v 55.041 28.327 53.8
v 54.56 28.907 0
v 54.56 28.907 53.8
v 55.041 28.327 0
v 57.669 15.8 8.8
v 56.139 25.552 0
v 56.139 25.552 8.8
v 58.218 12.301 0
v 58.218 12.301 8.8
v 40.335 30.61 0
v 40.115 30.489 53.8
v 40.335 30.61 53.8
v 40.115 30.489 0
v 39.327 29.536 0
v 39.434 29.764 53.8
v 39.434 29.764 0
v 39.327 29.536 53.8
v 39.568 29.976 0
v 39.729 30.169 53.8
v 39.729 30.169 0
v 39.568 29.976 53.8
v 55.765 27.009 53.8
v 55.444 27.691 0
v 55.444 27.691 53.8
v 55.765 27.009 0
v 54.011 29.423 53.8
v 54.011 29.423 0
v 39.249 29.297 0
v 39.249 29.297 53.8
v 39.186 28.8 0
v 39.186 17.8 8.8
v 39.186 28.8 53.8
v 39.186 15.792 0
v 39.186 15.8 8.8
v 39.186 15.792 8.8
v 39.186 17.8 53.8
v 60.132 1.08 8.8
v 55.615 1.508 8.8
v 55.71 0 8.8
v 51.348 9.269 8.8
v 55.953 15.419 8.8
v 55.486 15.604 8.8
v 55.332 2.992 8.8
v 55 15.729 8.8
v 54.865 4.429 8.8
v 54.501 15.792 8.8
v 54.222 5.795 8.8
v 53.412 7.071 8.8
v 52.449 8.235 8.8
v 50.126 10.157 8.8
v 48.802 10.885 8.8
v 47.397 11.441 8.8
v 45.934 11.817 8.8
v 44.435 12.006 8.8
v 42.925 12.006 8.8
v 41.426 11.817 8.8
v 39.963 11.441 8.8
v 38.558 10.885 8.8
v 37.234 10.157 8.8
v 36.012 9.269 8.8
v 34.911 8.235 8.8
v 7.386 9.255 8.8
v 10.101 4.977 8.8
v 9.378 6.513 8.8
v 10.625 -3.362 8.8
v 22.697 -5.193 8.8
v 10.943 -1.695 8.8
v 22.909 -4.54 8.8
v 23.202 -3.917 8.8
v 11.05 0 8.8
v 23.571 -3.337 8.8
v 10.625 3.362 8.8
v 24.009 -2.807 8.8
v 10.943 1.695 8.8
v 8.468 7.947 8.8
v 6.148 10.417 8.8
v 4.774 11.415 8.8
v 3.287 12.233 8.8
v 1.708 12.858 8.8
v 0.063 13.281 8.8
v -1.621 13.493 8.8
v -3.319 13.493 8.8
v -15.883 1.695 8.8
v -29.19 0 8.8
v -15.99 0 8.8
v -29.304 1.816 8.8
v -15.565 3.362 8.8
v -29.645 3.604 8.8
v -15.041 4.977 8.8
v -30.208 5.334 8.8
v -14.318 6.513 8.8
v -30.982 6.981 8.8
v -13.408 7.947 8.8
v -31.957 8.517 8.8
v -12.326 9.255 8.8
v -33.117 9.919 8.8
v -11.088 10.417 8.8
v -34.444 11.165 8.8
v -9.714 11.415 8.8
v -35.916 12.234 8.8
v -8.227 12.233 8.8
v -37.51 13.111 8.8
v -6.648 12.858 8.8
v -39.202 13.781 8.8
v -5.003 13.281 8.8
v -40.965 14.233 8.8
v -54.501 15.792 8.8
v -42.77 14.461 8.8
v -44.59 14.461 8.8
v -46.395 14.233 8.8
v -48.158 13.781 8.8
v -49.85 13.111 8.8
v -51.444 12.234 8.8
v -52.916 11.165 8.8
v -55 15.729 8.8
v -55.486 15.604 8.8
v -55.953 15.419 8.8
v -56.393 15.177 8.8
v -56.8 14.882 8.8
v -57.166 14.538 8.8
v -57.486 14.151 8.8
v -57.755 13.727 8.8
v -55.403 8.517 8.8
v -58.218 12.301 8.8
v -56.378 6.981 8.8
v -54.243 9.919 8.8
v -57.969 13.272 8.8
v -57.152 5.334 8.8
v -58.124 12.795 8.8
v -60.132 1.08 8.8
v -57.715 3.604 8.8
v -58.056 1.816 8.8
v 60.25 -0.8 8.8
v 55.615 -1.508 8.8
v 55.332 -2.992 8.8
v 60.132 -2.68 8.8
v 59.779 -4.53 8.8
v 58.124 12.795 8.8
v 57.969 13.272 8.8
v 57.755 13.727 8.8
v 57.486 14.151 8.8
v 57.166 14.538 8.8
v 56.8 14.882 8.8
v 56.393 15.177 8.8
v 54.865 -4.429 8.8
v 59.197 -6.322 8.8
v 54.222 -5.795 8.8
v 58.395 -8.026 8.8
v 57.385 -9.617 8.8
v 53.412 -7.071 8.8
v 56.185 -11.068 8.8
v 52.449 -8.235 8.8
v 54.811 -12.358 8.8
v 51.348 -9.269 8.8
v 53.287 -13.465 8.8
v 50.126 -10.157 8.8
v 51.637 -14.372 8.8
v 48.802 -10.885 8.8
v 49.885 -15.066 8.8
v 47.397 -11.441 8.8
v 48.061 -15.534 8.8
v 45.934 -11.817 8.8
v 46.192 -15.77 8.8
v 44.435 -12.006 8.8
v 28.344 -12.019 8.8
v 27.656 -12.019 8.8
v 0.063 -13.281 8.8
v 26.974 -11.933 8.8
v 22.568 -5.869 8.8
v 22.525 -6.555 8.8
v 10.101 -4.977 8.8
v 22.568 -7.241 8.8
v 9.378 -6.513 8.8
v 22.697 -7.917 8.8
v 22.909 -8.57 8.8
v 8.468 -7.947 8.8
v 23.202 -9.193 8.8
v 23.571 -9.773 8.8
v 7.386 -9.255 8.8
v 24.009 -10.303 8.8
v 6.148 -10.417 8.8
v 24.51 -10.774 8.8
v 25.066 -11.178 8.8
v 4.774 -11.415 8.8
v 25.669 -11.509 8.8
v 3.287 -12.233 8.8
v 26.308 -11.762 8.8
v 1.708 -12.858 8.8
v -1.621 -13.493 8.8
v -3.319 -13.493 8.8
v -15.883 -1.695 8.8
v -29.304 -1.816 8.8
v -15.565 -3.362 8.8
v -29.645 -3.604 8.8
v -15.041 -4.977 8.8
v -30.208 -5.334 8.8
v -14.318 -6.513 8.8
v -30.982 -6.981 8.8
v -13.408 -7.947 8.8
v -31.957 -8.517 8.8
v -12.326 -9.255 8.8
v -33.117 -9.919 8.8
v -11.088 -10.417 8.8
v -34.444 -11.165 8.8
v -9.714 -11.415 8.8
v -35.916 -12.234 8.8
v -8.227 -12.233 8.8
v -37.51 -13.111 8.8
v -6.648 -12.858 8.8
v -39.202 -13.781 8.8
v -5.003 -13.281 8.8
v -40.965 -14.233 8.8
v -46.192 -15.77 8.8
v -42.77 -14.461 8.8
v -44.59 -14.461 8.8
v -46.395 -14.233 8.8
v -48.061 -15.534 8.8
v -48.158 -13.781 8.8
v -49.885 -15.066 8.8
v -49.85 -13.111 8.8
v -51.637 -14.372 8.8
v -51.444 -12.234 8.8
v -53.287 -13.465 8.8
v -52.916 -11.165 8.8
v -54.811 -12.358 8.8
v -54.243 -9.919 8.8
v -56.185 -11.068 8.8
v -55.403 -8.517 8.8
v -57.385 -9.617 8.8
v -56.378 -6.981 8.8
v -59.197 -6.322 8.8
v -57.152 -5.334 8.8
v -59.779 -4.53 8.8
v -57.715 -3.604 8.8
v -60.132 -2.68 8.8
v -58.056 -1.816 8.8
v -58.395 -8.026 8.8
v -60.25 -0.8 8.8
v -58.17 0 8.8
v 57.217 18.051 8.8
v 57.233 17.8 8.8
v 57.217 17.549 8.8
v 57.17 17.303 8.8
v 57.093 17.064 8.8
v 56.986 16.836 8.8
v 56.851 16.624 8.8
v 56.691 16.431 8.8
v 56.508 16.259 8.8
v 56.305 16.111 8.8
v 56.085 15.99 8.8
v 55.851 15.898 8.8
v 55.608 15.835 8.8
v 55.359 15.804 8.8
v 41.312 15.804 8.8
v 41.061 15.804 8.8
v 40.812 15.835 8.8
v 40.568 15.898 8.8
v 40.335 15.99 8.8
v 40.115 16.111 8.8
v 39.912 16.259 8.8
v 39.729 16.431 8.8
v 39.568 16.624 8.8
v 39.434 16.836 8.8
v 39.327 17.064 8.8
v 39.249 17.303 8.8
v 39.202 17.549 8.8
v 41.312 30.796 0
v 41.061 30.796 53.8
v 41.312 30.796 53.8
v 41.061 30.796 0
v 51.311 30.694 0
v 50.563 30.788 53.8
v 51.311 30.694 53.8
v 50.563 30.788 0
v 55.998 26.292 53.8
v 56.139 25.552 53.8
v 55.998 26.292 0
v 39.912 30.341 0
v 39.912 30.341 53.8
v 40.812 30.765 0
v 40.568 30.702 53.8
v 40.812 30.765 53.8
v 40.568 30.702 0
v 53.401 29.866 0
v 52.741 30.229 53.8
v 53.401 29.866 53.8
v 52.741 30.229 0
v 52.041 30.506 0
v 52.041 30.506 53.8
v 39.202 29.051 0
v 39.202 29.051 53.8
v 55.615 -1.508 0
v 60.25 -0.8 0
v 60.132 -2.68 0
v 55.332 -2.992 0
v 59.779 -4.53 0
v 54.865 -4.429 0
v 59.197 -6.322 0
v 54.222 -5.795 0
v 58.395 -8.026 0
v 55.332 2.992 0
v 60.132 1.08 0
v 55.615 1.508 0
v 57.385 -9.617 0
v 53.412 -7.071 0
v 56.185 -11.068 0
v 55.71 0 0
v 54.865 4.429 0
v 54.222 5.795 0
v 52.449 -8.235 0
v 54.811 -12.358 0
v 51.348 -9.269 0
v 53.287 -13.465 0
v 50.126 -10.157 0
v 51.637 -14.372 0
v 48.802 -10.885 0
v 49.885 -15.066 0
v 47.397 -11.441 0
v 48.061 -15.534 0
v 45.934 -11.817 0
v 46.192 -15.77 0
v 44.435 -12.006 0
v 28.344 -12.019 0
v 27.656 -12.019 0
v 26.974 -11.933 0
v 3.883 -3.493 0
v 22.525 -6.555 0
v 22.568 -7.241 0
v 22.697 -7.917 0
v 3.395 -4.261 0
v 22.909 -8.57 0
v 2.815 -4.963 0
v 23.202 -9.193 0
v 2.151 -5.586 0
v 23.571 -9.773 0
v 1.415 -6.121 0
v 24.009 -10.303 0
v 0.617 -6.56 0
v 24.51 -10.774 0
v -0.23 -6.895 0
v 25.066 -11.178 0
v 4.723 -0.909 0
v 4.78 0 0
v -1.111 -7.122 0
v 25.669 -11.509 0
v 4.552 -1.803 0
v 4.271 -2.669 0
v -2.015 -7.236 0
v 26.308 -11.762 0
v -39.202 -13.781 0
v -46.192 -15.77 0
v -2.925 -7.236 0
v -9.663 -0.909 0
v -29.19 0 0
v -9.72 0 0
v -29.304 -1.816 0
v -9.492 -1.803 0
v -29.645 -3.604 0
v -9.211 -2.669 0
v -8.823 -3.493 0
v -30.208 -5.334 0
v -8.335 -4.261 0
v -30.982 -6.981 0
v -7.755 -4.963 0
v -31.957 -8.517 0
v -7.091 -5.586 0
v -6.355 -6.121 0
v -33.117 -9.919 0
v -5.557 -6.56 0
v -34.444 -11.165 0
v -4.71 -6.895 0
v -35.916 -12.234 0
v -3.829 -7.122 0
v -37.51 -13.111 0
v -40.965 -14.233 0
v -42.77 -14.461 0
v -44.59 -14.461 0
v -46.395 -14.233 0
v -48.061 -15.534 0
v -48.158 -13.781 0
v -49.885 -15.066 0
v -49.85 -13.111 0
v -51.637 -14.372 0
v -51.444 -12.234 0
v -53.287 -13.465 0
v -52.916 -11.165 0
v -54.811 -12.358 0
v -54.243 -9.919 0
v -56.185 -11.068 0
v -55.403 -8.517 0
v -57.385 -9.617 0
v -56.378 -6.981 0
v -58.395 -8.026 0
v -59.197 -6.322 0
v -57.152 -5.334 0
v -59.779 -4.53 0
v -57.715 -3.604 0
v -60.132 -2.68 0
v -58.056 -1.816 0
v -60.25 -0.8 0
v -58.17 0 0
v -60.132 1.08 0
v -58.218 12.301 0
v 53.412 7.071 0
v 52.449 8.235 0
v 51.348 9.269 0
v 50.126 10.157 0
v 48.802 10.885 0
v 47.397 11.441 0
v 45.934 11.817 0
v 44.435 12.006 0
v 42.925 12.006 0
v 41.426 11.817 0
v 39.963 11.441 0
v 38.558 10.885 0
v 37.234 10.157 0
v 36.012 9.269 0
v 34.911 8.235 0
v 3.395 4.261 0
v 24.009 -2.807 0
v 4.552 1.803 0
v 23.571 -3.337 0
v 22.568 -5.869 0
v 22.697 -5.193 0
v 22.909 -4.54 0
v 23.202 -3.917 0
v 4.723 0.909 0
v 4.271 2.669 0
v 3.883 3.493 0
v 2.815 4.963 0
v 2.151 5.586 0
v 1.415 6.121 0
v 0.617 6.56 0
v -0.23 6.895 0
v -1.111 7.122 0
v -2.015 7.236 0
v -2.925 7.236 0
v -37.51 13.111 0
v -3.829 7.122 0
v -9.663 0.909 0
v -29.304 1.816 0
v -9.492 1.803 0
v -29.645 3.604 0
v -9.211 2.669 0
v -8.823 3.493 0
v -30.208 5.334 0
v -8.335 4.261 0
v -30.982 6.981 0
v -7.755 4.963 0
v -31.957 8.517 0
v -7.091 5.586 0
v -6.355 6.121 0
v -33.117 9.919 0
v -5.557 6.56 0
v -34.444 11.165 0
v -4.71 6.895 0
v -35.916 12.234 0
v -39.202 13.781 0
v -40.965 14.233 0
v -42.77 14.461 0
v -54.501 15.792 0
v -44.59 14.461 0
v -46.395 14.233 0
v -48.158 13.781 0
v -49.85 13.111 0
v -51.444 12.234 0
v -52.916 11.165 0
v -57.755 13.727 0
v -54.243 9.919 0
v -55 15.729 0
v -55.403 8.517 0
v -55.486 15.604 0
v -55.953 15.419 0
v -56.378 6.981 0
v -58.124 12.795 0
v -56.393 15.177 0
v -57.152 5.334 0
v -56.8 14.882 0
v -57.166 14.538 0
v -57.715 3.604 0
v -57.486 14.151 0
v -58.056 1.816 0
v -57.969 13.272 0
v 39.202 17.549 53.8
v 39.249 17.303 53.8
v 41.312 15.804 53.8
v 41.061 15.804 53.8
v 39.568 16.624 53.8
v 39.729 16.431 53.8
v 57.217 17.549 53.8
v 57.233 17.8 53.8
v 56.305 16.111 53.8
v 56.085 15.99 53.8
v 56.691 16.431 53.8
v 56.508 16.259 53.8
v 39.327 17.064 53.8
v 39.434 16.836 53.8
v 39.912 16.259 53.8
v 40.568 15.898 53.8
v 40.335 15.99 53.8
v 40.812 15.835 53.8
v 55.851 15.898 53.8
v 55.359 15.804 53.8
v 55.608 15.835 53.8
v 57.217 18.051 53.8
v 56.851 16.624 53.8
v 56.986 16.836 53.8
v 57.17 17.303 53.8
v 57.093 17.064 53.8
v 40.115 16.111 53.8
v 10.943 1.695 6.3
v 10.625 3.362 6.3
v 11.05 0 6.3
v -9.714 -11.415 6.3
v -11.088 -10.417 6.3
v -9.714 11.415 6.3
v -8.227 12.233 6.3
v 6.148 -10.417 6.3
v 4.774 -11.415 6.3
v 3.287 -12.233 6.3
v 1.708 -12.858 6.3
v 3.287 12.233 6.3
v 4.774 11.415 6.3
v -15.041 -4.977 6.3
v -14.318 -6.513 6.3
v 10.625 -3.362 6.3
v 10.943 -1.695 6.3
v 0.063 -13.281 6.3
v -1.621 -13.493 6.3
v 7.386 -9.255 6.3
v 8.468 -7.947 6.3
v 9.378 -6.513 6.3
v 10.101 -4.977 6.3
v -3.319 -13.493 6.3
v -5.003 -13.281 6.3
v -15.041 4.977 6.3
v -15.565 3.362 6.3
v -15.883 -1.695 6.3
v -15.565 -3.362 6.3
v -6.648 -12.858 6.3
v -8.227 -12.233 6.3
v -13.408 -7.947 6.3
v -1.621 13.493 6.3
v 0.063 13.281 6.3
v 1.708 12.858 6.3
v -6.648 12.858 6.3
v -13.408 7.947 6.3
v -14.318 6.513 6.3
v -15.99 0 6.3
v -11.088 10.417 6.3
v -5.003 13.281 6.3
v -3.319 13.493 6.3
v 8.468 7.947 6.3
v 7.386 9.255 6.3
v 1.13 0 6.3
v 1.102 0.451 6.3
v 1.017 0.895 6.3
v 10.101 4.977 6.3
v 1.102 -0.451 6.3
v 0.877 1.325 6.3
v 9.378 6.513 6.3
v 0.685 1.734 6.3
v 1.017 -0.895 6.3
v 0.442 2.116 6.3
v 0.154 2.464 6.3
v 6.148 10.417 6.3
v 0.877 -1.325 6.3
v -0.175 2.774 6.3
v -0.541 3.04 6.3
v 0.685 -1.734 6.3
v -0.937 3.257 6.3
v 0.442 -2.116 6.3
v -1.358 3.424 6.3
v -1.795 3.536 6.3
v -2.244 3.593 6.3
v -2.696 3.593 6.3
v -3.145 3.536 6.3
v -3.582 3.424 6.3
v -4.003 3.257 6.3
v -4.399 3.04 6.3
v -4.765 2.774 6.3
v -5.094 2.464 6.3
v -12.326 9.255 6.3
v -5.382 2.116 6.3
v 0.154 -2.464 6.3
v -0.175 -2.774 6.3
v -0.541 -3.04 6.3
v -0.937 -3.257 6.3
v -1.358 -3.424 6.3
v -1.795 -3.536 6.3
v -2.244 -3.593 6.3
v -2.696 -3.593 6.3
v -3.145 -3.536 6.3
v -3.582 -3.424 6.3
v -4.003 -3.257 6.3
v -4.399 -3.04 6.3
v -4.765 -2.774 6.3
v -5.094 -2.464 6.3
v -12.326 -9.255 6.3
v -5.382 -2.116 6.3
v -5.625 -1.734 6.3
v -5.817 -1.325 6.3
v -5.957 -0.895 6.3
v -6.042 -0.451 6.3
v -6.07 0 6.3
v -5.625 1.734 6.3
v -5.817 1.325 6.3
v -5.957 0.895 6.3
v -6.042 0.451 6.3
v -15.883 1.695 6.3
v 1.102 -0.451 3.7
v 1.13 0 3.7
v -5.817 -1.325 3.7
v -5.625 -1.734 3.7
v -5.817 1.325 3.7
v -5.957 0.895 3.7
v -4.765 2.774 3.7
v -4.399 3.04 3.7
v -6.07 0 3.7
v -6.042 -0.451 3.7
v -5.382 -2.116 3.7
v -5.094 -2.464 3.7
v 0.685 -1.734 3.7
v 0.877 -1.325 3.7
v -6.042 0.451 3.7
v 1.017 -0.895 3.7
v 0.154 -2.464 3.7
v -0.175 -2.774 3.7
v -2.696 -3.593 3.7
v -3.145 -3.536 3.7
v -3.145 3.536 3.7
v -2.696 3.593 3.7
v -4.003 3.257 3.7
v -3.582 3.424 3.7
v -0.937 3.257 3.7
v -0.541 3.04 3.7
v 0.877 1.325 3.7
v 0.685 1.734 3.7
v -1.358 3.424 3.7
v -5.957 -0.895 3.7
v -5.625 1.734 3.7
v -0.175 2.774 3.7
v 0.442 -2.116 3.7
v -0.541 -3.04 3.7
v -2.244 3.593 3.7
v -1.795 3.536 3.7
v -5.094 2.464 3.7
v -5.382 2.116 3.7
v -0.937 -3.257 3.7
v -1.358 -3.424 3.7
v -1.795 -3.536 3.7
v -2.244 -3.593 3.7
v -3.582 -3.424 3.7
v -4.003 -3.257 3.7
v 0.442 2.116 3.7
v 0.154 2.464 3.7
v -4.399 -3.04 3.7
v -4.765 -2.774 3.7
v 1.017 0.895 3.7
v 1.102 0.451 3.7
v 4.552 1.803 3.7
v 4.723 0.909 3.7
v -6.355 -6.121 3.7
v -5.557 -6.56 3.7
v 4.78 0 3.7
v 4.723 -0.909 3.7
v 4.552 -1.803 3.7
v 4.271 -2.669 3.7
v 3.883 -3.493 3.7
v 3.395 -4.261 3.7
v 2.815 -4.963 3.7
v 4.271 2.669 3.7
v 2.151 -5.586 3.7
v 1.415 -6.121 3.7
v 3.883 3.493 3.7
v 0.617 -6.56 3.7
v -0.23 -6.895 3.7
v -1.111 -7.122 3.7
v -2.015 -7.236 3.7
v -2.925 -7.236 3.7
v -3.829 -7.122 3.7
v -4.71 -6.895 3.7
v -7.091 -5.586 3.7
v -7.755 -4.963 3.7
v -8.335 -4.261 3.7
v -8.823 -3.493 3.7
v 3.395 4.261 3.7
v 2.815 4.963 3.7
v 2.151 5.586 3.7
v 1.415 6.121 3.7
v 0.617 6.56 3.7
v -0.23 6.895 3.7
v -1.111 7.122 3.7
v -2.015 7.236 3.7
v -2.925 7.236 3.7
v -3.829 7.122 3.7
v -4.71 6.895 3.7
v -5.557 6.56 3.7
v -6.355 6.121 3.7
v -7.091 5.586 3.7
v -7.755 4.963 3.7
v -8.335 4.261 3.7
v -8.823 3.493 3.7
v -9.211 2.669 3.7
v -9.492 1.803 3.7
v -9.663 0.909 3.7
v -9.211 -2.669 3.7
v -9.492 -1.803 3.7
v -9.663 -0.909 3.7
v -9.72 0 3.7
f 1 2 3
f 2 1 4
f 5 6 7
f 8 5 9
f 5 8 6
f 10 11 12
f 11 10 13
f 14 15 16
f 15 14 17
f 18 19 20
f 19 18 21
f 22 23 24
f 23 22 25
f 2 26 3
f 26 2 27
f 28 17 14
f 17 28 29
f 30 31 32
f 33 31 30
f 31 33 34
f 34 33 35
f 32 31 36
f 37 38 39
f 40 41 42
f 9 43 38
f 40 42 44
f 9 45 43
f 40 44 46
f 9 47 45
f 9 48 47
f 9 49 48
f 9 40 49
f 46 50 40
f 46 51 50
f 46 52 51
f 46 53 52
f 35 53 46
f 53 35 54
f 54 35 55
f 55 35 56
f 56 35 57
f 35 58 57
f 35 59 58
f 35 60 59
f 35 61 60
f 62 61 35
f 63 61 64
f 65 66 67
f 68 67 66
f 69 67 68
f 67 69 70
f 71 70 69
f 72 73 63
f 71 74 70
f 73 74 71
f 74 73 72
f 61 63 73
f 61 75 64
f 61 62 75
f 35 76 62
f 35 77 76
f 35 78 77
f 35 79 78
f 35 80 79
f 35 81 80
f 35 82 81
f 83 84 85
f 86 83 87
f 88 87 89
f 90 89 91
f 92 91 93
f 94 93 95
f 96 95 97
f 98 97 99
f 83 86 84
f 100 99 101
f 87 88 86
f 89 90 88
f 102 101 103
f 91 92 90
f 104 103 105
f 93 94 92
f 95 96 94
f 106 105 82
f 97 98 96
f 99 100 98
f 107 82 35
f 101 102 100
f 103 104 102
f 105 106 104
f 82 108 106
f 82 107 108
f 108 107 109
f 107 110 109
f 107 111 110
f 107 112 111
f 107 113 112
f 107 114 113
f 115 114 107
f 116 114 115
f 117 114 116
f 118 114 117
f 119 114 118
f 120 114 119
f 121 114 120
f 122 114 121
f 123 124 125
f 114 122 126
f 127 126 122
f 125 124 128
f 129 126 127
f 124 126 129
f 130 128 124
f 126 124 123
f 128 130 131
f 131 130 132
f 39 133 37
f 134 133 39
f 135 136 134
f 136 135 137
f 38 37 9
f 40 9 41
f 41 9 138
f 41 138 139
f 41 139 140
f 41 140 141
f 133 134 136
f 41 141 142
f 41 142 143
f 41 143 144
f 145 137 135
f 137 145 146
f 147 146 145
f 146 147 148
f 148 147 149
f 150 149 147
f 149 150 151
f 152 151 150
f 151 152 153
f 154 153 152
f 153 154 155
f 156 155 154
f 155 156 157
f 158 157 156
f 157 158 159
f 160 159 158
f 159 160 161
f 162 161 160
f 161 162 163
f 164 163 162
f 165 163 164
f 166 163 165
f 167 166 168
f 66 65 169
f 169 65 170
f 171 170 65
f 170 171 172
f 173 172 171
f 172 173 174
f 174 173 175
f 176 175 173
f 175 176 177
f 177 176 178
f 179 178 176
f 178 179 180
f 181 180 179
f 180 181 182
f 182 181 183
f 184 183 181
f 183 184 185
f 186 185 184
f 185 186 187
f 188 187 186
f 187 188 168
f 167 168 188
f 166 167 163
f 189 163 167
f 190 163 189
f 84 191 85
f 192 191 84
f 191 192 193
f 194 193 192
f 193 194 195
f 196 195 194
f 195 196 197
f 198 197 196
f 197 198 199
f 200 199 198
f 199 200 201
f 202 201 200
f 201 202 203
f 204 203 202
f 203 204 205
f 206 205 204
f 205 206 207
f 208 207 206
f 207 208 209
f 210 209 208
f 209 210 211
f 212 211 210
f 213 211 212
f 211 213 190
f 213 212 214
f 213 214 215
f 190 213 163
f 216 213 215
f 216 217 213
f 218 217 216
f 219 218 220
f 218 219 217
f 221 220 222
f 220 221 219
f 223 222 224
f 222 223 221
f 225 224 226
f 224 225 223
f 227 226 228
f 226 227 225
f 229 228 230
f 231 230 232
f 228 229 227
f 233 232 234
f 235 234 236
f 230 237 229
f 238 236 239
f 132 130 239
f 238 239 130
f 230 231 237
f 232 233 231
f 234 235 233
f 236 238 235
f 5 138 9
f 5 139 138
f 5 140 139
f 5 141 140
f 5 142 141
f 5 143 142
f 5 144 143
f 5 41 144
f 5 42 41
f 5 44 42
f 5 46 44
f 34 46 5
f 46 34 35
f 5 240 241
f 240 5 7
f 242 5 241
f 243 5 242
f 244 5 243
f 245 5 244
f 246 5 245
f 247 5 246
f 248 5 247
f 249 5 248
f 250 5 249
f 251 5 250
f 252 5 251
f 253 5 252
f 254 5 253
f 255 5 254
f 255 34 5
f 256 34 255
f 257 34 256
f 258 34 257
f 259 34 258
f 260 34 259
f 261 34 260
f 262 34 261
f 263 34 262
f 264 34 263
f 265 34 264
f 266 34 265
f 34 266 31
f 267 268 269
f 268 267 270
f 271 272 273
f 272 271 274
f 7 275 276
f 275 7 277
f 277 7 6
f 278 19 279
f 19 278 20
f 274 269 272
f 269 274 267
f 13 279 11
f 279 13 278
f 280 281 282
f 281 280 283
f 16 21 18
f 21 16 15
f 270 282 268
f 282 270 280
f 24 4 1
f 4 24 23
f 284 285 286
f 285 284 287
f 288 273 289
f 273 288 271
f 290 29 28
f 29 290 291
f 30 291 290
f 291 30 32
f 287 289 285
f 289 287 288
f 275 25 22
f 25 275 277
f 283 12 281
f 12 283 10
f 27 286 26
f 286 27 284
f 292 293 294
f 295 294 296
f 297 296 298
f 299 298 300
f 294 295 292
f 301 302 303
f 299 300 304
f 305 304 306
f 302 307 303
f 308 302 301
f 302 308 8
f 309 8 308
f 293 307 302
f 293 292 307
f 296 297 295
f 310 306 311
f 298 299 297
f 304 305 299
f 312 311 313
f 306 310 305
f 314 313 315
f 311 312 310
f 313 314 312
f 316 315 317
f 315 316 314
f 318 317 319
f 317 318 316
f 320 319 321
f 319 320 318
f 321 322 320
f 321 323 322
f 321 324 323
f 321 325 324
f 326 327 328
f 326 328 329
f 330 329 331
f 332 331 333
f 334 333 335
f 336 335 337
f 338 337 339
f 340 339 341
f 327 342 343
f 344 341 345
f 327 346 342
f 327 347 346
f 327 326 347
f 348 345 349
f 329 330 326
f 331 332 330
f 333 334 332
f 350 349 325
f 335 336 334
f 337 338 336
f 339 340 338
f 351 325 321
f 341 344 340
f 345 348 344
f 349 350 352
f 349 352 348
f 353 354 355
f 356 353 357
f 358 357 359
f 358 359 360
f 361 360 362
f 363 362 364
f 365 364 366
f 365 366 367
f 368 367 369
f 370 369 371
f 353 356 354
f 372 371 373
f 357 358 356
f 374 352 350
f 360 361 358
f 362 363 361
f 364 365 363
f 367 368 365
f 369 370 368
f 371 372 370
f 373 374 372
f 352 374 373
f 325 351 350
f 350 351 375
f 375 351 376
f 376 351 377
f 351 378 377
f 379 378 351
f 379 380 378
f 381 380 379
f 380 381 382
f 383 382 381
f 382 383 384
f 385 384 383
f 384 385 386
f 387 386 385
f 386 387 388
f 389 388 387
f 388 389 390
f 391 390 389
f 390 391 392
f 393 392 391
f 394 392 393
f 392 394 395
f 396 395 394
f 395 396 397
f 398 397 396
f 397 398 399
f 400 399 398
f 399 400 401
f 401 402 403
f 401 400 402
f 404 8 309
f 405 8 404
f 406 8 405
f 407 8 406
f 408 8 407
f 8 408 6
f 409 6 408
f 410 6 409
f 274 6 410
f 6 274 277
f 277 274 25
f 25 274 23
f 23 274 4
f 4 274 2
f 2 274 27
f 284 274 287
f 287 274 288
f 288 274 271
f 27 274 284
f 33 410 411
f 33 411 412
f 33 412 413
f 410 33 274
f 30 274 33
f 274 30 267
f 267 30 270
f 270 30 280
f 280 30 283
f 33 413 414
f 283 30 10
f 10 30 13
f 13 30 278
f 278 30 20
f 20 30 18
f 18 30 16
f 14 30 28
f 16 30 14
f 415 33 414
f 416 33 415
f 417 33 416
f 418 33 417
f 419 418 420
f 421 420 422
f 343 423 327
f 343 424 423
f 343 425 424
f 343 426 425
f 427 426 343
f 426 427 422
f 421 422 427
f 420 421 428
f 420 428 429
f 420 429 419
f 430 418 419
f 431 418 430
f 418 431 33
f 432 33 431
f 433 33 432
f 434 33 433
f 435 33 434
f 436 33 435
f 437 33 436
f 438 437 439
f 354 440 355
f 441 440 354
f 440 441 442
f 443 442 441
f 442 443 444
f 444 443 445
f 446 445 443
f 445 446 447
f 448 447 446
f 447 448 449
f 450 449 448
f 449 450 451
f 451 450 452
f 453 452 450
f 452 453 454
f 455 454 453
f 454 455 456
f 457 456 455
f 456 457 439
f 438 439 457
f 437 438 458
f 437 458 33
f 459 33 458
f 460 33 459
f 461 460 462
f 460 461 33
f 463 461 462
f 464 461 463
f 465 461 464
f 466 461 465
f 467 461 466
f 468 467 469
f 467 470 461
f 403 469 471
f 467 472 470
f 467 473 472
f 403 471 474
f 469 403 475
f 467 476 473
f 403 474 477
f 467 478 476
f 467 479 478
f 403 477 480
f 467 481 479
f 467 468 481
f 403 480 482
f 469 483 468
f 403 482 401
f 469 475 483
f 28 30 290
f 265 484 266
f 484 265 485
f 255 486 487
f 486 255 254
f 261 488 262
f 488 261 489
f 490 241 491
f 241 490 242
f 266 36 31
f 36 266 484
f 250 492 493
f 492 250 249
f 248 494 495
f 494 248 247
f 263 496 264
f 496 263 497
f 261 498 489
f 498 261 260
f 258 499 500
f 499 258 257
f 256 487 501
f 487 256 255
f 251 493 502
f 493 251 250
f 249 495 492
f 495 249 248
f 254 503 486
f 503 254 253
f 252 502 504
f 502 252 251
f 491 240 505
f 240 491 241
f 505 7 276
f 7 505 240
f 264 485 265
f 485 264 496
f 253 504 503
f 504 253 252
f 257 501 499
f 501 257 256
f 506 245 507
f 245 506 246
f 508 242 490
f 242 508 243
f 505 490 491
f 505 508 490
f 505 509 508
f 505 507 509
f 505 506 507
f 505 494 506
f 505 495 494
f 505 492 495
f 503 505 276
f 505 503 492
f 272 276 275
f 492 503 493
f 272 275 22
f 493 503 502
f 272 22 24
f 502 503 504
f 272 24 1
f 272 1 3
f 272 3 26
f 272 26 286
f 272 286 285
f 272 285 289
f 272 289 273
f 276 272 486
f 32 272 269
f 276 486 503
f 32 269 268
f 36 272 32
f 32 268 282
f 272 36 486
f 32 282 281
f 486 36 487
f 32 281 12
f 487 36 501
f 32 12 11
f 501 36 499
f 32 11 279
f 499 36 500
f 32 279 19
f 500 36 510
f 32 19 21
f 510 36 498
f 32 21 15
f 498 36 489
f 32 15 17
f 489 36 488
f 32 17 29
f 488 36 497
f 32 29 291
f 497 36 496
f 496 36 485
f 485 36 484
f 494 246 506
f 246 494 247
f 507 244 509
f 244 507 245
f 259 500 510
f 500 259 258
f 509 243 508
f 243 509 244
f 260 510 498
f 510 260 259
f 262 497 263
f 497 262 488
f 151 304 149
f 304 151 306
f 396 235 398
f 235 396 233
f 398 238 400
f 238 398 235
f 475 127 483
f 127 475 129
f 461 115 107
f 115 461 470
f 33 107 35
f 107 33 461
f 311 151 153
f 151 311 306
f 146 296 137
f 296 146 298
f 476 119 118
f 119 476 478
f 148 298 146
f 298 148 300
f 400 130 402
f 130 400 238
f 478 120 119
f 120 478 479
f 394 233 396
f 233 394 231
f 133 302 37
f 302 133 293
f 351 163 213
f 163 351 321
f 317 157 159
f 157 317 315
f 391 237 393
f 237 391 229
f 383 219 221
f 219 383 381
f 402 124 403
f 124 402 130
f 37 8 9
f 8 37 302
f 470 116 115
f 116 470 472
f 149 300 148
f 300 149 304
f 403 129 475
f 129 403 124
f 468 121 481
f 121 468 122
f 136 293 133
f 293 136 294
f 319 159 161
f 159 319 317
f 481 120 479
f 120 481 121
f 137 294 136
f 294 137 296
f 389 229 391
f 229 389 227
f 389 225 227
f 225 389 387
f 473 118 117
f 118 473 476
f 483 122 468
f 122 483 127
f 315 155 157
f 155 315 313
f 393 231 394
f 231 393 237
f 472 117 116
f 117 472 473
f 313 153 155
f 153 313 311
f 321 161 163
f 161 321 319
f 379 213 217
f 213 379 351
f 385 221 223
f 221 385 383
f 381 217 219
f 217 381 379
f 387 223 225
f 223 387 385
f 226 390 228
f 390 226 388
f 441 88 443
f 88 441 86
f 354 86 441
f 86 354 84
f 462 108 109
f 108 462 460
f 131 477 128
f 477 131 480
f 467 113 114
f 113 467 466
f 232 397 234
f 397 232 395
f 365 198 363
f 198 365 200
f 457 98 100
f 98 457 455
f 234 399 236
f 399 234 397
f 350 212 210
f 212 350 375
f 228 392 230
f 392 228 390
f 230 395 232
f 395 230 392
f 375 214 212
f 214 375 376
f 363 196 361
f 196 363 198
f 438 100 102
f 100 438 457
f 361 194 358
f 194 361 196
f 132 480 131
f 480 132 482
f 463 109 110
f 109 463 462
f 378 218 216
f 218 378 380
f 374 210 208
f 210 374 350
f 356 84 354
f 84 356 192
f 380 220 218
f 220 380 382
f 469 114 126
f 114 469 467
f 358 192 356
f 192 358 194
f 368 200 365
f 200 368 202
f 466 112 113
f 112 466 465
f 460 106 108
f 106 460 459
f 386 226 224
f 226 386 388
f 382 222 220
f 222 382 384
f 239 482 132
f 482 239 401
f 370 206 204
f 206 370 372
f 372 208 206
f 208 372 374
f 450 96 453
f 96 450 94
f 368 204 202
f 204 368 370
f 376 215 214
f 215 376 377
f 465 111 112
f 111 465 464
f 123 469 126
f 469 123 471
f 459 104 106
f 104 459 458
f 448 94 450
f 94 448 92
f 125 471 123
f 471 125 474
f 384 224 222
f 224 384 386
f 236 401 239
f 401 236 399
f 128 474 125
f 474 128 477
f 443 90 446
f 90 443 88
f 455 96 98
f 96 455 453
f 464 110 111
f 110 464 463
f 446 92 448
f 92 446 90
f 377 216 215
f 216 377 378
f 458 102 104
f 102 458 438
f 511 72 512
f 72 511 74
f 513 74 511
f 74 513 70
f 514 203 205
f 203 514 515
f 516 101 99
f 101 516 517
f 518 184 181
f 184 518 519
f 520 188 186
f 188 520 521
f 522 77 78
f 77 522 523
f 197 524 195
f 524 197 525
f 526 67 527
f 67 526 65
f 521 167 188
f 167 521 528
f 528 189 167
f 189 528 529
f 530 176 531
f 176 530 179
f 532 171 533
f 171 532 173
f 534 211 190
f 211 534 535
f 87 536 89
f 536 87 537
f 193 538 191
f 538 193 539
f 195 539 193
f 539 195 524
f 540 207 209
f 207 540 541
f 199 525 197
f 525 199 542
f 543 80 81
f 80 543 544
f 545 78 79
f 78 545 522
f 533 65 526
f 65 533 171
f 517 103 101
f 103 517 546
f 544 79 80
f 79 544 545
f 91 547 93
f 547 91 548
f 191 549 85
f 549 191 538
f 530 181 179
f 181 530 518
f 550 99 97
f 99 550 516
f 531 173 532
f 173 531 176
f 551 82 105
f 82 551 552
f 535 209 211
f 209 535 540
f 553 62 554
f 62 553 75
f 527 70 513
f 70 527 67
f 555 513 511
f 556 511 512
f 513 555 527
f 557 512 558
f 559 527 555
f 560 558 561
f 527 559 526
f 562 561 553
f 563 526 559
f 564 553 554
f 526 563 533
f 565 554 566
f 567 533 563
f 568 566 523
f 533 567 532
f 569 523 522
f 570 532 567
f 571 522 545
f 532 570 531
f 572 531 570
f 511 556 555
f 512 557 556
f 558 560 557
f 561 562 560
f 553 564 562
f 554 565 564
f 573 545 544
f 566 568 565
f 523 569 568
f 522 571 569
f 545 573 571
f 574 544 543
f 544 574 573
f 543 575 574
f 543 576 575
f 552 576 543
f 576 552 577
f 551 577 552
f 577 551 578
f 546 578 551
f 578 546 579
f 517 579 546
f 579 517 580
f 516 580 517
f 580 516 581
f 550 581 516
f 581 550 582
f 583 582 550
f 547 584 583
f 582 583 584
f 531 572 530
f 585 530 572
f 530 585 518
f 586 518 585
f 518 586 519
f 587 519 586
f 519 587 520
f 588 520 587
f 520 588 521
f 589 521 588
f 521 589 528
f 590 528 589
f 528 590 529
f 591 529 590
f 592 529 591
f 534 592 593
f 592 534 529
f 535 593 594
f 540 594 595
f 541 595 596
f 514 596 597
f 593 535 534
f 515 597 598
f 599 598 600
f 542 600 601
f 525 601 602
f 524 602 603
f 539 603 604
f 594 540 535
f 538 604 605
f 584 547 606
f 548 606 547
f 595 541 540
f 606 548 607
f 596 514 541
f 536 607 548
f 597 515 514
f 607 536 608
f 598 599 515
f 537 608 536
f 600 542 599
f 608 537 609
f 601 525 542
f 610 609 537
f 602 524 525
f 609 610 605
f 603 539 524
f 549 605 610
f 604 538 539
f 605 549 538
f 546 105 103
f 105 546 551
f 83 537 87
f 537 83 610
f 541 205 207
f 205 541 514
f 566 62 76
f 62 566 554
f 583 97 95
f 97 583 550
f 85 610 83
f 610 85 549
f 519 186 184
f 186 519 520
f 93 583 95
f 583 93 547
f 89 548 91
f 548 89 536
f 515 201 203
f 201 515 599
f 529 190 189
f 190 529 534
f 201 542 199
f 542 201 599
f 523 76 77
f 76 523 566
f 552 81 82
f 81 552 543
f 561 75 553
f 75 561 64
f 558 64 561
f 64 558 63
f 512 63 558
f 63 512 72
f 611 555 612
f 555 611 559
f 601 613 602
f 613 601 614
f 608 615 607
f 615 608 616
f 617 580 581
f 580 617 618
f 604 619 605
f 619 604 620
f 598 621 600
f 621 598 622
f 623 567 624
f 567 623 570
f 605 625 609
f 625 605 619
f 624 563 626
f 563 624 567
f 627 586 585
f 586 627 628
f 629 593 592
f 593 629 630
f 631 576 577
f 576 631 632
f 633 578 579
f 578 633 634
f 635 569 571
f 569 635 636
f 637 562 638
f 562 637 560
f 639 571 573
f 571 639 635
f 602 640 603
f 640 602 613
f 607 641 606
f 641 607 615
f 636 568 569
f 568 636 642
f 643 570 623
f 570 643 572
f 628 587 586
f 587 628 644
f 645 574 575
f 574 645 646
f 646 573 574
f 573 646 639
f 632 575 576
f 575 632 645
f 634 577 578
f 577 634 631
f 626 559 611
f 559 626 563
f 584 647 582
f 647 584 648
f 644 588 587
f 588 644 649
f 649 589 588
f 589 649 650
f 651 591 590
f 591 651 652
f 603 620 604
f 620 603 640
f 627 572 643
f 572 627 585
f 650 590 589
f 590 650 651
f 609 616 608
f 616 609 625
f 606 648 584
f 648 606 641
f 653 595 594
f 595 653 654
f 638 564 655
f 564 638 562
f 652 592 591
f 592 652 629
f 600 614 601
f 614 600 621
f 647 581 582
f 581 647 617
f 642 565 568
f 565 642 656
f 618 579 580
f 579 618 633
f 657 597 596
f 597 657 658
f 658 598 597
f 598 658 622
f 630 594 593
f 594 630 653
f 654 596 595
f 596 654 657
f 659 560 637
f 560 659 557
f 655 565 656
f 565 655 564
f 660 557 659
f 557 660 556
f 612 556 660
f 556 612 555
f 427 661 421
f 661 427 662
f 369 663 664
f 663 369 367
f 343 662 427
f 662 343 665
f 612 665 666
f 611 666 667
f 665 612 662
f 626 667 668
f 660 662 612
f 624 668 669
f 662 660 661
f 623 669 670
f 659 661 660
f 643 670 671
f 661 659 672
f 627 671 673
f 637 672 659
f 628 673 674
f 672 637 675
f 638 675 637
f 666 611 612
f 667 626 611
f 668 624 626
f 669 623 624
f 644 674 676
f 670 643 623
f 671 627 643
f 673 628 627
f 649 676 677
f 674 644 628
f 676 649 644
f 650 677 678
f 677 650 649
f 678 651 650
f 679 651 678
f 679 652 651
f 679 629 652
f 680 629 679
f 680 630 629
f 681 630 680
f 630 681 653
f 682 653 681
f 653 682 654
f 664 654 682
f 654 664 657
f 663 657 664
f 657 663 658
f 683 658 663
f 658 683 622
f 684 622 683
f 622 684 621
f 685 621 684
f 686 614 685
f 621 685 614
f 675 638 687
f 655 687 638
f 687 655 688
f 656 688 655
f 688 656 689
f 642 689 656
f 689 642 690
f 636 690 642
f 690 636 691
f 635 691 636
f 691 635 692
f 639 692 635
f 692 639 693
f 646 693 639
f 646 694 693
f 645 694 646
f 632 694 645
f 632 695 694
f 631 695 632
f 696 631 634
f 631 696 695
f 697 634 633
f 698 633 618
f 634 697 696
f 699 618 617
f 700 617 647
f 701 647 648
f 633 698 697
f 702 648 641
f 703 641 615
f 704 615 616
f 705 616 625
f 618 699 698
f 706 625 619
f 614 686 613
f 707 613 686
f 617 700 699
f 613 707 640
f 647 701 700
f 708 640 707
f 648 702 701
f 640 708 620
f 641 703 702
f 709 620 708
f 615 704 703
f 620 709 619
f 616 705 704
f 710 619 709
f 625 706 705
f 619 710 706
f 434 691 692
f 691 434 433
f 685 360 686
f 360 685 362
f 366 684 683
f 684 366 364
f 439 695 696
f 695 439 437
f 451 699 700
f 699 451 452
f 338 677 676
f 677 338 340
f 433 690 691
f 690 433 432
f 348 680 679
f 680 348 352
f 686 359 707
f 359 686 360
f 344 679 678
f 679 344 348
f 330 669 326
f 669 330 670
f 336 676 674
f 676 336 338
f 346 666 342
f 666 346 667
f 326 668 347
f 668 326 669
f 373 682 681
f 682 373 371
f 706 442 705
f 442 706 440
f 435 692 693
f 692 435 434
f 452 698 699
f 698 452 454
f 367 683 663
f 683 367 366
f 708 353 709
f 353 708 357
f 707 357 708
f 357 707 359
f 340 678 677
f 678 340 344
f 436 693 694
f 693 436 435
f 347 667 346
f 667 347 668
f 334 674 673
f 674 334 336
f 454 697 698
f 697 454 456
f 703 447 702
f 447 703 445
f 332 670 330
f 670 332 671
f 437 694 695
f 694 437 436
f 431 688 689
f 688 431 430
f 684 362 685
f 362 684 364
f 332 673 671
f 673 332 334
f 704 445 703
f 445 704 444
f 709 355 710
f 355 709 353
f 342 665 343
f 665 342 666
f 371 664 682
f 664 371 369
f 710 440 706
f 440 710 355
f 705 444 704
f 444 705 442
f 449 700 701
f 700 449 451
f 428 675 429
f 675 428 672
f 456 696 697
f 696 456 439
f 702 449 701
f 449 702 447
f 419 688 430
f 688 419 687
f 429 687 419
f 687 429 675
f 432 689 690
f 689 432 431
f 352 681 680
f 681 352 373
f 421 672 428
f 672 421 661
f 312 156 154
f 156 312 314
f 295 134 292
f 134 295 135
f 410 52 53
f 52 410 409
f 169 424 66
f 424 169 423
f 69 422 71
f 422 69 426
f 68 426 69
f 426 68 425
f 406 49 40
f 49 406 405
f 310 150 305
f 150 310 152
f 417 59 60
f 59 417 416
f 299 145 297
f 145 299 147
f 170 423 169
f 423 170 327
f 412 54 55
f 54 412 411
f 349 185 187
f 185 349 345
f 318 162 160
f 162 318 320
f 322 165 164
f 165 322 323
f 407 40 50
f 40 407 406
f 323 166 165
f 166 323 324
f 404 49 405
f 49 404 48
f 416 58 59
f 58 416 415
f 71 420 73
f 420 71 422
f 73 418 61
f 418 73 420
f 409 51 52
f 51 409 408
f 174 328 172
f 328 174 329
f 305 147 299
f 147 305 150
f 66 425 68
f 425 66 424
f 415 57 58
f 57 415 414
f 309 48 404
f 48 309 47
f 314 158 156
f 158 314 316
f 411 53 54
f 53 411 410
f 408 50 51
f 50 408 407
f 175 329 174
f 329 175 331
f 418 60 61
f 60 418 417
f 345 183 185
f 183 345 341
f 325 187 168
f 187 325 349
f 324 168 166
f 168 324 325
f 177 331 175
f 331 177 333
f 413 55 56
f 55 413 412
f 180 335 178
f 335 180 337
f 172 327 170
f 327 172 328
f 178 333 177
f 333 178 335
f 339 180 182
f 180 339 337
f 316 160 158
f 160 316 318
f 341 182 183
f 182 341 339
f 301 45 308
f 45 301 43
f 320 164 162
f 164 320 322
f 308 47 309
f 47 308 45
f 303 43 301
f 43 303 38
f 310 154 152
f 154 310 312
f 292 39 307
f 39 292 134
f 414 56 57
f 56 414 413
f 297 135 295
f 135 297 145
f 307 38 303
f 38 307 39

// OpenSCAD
$fn=50;

cam_width = 120.5;
cam_depth = 31.6;

cam_slope = 2;

cam_back_radius = 15;
cam_front_radius = 4;

base_plate_thickness = 8.8;
handle_height = 45; // TODO make a bit higher

hole_tolerance = 1; // will be added to the measured diameters

// work in progress {
// Create a hull of two to four circles
// Usage: RoundedCornerPolygon([x1, y1, r1], ..., [x4, y4, r4])
module RoundedCornerPolygon(A=[0, 0, 0], B=[0, 0, 0], C=[0, 0, -1], D=[0, 0, -1]) {

	// adapted from http://www.thingiverse.com/thing:9347 {
	hull() {

		translate([A[0], A[1], 0])
		circle(r=A[2]);

		translate([B[0], B[1], 0])
		circle(r=B[2]);

		if (C[2]!=-1) {

			translate([C[0], C[1], 0])
			circle(r=C[2]);

			if (C[2]!=-1) {

				translate([D[0], D[1], 0])
				circle(r=D[2]);

			}

		}

	}
	// }

}
// }

module BasePlate() {

	linear_extrude(height=base_plate_thickness)
	RoundedCornerPolygon([-(cam_width/2-cam_back_radius), -(cam_depth/2-cam_back_radius), cam_back_radius], 
		[(cam_width/2-cam_back_radius), -(cam_depth/2-cam_back_radius), cam_back_radius], 
		[(cam_width/2-cam_front_radius-cam_slope), (cam_depth/2-cam_front_radius), cam_front_radius], 
		[-(cam_width/2-cam_front_radius-cam_slope), (cam_depth/2-cam_front_radius), cam_front_radius]);

}

module Handle() {

	handle_depth = 15;
	handle_width = 17;

	handle_outer_radius = 6;
	handle_radius = 2;

	handle_outer_right_corner_x = (cam_width/2-handle_outer_radius-(cam_depth+handle_depth-cam_back_radius-handle_outer_radius)*cam_slope/(cam_depth-cam_back_radius-cam_front_radius));
	handle_outer_right_corner_y = cam_depth/2+handle_depth-handle_outer_radius;

	handle_outer_left_corner_x = handle_outer_right_corner_x+handle_outer_radius-handle_width+handle_radius;
	handle_outer_left_corner_y = cam_depth/2+handle_depth-handle_radius;

	handle_inner_right_corner_x = -cam_slope / (cam_depth/2-cam_front_radius) * (cam_depth/2+handle_radius) + cam_width/2-cam_front_radius+handle_radius;//TODO bug
	handle_inner_right_corner_y = cam_depth/2+handle_radius;

	handle_inner_left_corner_x = handle_outer_left_corner_x;
	handle_inner_left_corner_y = handle_inner_right_corner_y;


	//difference() {

		// handle base
		difference() {

			union(){

				linear_extrude(height=base_plate_thickness)
				RoundedCornerPolygon([(cam_width/2-cam_front_radius-cam_slope), (cam_depth/2-cam_front_radius), cam_front_radius],
					[handle_outer_right_corner_x, (cam_depth/2+handle_depth-handle_outer_radius), handle_outer_radius],
					[handle_outer_left_corner_x, (cam_depth/2+handle_depth-handle_radius), handle_radius],
					[handle_inner_left_corner_x, (cam_depth/2-cam_front_radius), handle_radius]);
	
				linear_extrude(height=base_plate_thickness+handle_height)
				RoundedCornerPolygon([handle_inner_right_corner_x, handle_inner_right_corner_y, handle_radius],
					[handle_outer_right_corner_x, handle_outer_right_corner_y, handle_outer_radius],
					[handle_outer_left_corner_x, handle_outer_left_corner_y, handle_radius],
					[handle_inner_left_corner_x, handle_inner_left_corner_y, handle_radius]);

				// does not work yet
				
				/*translate([0, 0, base_plate_thickness+handle_height])
				//minkowski() {

					linear_extrude(height=base_plate_thickness)
					hull() {

						polygon(points=[[handle_inner_right_corner_x, handle_inner_right_corner_y],
							[handle_outer_left_corner_x, handle_outer_left_corner_y],
							[handle_inner_left_corner_x, handle_inner_left_corner_y]], paths=[0,1,2]);
			
						//translate([handle_inner_right_corner_x, 
//							handle_inner_right_corner_y, 
//							0])
//						circle(r=cam_front_radius);
						
						translate([handle_outer_right_corner_x, 
							handle_outer_right_corner_y, 
							0])
						circle(r=handle_outer_radius-handle_radius);
		
//						translate([handle_outer_left_corner_x, 
//							handle_outer_left_corner_y, 
//							0])
//						circle(r=handle_radius);
//				
//						translate([handle_outer_left_corner_x, 
//							handle_inner_left_corner_y, 
//							0])
//						circle(r=cam_front_radius);
		
					}

					//sphere(r=handle_radius);

				//}*/
	
			}

			// handle top
			/*difference() {	

				translate([0, cam_depth/2+handle_radius-10, base_plate_thickness+handle_height-handle_radius-handle_outer_radius])
				rotate([-10, 0, 0]){

					linear_extrude(height=handle_height) // doesn't really matter
					square(size = [cam_width, handle_depth*2], center = false); // doesn't really matter

				}
				
				translate([cam_width/2-cam_slope-handle_width/2-cam_slope-2, // more or less...
					cam_depth/2+3, 
					0]) 
				rotate([0, 90, 0]) {

					rotate_extrude(convexity = 10, $fn = 100) {

						translate([handle_height+base_plate_thickness-handle_radius-1.8*handle_width/2, 0, 0])
						circle(r = 1.8*handle_width/2);

					}
		
				}
	
			}*/
			
			// Cut away excess material from the handle
			translate([0, 0, base_plate_thickness])
			linear_extrude(height=2*handle_height)
			square(size = [cam_width, cam_depth], center = true);
	
		}

	//}

}

// function to make simple holes, supports negative depth!
module Hole(diameter, depth, placement=[0, 0, 0]) {

	placement_offset=depth < 0? [0, 0, depth] : [0, 0, 0];
	translate(placement+placement_offset)
	linear_extrude(height=abs(depth))
	circle(r=diameter/2);

}

module BasePlateHoles(tolerance = 0) {

	left_hole_diameter = 27.98;
	
	center_hole_diameter = 26.04;
	center_hole_depth = 2.5;
	tripod_hole_diameter = 6.2;
	tripod_screw_head_diameter = 13.50;
	tripod_screw_head_height = 3.7;
	
	right_hole_diameter = 23.06;
	right_little_hole_diameter = 9.95;
	
	left_to_center_dist = 14.2;
	center_to_right_dist = 21.6;
	right_to_right_little_dist = 33.5;
	
	left_hole_x = -(left_hole_diameter/2 + left_to_center_dist + center_hole_diameter + center_to_right_dist + right_hole_diameter/2)/2;
	center_hole_x = left_hole_x + left_hole_diameter/2 + left_to_center_dist + center_hole_diameter/2;
	right_hole_x = -left_hole_x;// assuming symmetry!
	
	Hole(left_hole_diameter+tolerance, 
		base_plate_thickness,
		[left_hole_x, 0, 0]);

	Hole(center_hole_diameter+tolerance,
		-center_hole_depth,
		[center_hole_x, 0, base_plate_thickness]);

	Hole(tripod_hole_diameter+tolerance,
		base_plate_thickness,
		[center_hole_x, 0, 0]);

	Hole(tripod_screw_head_diameter+tolerance,
		tripod_screw_head_height,
		[center_hole_x, 0, 0]);

	translate([right_hole_x, 0, 0])
	hull() {

		Hole(right_hole_diameter+tolerance,
			base_plate_thickness);

		Hole(right_little_hole_diameter+tolerance,
			base_plate_thickness,
			[-sqrt(right_to_right_little_dist*right_to_right_little_dist - right_to_right_little_dist*(right_hole_diameter+right_little_hole_diameter) + right_hole_diameter*right_little_hole_diameter), 
			-right_hole_diameter/2+right_little_hole_diameter/2, 
			0]);

	}

}

module BasePlateWithHolesAndHandle() {

	// Cut Holes for levers on the bottom of the camera
	difference() {

		// Join BasePlate and Handle
		union() {

			BasePlate();
			Handle();

		}

		BasePlateHoles(hole_tolerance);

	}

}

BasePlateWithHolesAndHandle();

//linear_extrude 
%polygon(points=[[0, 0],[0, 100],[100, 0]], paths=[0,1,2], convexity = 2);
